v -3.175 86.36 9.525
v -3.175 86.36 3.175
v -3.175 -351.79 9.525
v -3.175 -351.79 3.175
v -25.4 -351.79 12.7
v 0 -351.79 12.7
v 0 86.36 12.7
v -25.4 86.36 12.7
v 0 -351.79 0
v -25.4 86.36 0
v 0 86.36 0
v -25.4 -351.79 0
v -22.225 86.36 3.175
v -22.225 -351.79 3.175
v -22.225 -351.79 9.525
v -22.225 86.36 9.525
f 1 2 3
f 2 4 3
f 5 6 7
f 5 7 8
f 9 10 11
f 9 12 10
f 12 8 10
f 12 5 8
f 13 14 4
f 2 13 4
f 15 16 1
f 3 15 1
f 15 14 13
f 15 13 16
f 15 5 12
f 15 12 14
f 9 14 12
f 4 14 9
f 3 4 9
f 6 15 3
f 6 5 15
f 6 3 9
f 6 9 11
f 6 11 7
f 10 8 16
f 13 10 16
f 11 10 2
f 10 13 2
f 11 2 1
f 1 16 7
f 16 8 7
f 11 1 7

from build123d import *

# Parameters (mm, degrees)
F0_W     = 19.05
F0_H     = 6.35
F1_DEPTH = 265.43
F2_W     = 25.4
F2_H     = 12.7
F2_W_2   = 19.05
F2_H_2   = 6.35
F3_DEPTH = 86.36
F4_DEPTH = 86.36


with BuildPart() as f1:
    # F0 (on Front) → F1 (new body)
    with BuildSketch(Plane.XZ):
        Polygon((-25.4, 0), (0, 0), (0, 12.7), (-25.4, 12.7), (-25.4, 9.525), align=None)
        with Locations((-12.7, 6.35)):
            Rectangle(F0_W, F0_H, mode=Mode.SUBTRACT)
    extrude(amount=F1_DEPTH)

    # F2 (on face) → F3 (join)
    with BuildSketch(Plane.XZ.offset(265.43)):
        with Locations((-12.7, 6.35)):
            Rectangle(F2_W, F2_H)
        with Locations((-12.7, 6.35)):
            Rectangle(F2_W_2, F2_H_2, mode=Mode.SUBTRACT)
    extrude(amount=F3_DEPTH)

    # F4 (add): a face of the model
    f4_faces = [f1.faces().sort_by_distance(p)[0] for p in [
        (-12.7, 0, 0.2839806331),
    ]]
    extrude(f4_faces, amount=F4_DEPTH)


solid = f1.part
